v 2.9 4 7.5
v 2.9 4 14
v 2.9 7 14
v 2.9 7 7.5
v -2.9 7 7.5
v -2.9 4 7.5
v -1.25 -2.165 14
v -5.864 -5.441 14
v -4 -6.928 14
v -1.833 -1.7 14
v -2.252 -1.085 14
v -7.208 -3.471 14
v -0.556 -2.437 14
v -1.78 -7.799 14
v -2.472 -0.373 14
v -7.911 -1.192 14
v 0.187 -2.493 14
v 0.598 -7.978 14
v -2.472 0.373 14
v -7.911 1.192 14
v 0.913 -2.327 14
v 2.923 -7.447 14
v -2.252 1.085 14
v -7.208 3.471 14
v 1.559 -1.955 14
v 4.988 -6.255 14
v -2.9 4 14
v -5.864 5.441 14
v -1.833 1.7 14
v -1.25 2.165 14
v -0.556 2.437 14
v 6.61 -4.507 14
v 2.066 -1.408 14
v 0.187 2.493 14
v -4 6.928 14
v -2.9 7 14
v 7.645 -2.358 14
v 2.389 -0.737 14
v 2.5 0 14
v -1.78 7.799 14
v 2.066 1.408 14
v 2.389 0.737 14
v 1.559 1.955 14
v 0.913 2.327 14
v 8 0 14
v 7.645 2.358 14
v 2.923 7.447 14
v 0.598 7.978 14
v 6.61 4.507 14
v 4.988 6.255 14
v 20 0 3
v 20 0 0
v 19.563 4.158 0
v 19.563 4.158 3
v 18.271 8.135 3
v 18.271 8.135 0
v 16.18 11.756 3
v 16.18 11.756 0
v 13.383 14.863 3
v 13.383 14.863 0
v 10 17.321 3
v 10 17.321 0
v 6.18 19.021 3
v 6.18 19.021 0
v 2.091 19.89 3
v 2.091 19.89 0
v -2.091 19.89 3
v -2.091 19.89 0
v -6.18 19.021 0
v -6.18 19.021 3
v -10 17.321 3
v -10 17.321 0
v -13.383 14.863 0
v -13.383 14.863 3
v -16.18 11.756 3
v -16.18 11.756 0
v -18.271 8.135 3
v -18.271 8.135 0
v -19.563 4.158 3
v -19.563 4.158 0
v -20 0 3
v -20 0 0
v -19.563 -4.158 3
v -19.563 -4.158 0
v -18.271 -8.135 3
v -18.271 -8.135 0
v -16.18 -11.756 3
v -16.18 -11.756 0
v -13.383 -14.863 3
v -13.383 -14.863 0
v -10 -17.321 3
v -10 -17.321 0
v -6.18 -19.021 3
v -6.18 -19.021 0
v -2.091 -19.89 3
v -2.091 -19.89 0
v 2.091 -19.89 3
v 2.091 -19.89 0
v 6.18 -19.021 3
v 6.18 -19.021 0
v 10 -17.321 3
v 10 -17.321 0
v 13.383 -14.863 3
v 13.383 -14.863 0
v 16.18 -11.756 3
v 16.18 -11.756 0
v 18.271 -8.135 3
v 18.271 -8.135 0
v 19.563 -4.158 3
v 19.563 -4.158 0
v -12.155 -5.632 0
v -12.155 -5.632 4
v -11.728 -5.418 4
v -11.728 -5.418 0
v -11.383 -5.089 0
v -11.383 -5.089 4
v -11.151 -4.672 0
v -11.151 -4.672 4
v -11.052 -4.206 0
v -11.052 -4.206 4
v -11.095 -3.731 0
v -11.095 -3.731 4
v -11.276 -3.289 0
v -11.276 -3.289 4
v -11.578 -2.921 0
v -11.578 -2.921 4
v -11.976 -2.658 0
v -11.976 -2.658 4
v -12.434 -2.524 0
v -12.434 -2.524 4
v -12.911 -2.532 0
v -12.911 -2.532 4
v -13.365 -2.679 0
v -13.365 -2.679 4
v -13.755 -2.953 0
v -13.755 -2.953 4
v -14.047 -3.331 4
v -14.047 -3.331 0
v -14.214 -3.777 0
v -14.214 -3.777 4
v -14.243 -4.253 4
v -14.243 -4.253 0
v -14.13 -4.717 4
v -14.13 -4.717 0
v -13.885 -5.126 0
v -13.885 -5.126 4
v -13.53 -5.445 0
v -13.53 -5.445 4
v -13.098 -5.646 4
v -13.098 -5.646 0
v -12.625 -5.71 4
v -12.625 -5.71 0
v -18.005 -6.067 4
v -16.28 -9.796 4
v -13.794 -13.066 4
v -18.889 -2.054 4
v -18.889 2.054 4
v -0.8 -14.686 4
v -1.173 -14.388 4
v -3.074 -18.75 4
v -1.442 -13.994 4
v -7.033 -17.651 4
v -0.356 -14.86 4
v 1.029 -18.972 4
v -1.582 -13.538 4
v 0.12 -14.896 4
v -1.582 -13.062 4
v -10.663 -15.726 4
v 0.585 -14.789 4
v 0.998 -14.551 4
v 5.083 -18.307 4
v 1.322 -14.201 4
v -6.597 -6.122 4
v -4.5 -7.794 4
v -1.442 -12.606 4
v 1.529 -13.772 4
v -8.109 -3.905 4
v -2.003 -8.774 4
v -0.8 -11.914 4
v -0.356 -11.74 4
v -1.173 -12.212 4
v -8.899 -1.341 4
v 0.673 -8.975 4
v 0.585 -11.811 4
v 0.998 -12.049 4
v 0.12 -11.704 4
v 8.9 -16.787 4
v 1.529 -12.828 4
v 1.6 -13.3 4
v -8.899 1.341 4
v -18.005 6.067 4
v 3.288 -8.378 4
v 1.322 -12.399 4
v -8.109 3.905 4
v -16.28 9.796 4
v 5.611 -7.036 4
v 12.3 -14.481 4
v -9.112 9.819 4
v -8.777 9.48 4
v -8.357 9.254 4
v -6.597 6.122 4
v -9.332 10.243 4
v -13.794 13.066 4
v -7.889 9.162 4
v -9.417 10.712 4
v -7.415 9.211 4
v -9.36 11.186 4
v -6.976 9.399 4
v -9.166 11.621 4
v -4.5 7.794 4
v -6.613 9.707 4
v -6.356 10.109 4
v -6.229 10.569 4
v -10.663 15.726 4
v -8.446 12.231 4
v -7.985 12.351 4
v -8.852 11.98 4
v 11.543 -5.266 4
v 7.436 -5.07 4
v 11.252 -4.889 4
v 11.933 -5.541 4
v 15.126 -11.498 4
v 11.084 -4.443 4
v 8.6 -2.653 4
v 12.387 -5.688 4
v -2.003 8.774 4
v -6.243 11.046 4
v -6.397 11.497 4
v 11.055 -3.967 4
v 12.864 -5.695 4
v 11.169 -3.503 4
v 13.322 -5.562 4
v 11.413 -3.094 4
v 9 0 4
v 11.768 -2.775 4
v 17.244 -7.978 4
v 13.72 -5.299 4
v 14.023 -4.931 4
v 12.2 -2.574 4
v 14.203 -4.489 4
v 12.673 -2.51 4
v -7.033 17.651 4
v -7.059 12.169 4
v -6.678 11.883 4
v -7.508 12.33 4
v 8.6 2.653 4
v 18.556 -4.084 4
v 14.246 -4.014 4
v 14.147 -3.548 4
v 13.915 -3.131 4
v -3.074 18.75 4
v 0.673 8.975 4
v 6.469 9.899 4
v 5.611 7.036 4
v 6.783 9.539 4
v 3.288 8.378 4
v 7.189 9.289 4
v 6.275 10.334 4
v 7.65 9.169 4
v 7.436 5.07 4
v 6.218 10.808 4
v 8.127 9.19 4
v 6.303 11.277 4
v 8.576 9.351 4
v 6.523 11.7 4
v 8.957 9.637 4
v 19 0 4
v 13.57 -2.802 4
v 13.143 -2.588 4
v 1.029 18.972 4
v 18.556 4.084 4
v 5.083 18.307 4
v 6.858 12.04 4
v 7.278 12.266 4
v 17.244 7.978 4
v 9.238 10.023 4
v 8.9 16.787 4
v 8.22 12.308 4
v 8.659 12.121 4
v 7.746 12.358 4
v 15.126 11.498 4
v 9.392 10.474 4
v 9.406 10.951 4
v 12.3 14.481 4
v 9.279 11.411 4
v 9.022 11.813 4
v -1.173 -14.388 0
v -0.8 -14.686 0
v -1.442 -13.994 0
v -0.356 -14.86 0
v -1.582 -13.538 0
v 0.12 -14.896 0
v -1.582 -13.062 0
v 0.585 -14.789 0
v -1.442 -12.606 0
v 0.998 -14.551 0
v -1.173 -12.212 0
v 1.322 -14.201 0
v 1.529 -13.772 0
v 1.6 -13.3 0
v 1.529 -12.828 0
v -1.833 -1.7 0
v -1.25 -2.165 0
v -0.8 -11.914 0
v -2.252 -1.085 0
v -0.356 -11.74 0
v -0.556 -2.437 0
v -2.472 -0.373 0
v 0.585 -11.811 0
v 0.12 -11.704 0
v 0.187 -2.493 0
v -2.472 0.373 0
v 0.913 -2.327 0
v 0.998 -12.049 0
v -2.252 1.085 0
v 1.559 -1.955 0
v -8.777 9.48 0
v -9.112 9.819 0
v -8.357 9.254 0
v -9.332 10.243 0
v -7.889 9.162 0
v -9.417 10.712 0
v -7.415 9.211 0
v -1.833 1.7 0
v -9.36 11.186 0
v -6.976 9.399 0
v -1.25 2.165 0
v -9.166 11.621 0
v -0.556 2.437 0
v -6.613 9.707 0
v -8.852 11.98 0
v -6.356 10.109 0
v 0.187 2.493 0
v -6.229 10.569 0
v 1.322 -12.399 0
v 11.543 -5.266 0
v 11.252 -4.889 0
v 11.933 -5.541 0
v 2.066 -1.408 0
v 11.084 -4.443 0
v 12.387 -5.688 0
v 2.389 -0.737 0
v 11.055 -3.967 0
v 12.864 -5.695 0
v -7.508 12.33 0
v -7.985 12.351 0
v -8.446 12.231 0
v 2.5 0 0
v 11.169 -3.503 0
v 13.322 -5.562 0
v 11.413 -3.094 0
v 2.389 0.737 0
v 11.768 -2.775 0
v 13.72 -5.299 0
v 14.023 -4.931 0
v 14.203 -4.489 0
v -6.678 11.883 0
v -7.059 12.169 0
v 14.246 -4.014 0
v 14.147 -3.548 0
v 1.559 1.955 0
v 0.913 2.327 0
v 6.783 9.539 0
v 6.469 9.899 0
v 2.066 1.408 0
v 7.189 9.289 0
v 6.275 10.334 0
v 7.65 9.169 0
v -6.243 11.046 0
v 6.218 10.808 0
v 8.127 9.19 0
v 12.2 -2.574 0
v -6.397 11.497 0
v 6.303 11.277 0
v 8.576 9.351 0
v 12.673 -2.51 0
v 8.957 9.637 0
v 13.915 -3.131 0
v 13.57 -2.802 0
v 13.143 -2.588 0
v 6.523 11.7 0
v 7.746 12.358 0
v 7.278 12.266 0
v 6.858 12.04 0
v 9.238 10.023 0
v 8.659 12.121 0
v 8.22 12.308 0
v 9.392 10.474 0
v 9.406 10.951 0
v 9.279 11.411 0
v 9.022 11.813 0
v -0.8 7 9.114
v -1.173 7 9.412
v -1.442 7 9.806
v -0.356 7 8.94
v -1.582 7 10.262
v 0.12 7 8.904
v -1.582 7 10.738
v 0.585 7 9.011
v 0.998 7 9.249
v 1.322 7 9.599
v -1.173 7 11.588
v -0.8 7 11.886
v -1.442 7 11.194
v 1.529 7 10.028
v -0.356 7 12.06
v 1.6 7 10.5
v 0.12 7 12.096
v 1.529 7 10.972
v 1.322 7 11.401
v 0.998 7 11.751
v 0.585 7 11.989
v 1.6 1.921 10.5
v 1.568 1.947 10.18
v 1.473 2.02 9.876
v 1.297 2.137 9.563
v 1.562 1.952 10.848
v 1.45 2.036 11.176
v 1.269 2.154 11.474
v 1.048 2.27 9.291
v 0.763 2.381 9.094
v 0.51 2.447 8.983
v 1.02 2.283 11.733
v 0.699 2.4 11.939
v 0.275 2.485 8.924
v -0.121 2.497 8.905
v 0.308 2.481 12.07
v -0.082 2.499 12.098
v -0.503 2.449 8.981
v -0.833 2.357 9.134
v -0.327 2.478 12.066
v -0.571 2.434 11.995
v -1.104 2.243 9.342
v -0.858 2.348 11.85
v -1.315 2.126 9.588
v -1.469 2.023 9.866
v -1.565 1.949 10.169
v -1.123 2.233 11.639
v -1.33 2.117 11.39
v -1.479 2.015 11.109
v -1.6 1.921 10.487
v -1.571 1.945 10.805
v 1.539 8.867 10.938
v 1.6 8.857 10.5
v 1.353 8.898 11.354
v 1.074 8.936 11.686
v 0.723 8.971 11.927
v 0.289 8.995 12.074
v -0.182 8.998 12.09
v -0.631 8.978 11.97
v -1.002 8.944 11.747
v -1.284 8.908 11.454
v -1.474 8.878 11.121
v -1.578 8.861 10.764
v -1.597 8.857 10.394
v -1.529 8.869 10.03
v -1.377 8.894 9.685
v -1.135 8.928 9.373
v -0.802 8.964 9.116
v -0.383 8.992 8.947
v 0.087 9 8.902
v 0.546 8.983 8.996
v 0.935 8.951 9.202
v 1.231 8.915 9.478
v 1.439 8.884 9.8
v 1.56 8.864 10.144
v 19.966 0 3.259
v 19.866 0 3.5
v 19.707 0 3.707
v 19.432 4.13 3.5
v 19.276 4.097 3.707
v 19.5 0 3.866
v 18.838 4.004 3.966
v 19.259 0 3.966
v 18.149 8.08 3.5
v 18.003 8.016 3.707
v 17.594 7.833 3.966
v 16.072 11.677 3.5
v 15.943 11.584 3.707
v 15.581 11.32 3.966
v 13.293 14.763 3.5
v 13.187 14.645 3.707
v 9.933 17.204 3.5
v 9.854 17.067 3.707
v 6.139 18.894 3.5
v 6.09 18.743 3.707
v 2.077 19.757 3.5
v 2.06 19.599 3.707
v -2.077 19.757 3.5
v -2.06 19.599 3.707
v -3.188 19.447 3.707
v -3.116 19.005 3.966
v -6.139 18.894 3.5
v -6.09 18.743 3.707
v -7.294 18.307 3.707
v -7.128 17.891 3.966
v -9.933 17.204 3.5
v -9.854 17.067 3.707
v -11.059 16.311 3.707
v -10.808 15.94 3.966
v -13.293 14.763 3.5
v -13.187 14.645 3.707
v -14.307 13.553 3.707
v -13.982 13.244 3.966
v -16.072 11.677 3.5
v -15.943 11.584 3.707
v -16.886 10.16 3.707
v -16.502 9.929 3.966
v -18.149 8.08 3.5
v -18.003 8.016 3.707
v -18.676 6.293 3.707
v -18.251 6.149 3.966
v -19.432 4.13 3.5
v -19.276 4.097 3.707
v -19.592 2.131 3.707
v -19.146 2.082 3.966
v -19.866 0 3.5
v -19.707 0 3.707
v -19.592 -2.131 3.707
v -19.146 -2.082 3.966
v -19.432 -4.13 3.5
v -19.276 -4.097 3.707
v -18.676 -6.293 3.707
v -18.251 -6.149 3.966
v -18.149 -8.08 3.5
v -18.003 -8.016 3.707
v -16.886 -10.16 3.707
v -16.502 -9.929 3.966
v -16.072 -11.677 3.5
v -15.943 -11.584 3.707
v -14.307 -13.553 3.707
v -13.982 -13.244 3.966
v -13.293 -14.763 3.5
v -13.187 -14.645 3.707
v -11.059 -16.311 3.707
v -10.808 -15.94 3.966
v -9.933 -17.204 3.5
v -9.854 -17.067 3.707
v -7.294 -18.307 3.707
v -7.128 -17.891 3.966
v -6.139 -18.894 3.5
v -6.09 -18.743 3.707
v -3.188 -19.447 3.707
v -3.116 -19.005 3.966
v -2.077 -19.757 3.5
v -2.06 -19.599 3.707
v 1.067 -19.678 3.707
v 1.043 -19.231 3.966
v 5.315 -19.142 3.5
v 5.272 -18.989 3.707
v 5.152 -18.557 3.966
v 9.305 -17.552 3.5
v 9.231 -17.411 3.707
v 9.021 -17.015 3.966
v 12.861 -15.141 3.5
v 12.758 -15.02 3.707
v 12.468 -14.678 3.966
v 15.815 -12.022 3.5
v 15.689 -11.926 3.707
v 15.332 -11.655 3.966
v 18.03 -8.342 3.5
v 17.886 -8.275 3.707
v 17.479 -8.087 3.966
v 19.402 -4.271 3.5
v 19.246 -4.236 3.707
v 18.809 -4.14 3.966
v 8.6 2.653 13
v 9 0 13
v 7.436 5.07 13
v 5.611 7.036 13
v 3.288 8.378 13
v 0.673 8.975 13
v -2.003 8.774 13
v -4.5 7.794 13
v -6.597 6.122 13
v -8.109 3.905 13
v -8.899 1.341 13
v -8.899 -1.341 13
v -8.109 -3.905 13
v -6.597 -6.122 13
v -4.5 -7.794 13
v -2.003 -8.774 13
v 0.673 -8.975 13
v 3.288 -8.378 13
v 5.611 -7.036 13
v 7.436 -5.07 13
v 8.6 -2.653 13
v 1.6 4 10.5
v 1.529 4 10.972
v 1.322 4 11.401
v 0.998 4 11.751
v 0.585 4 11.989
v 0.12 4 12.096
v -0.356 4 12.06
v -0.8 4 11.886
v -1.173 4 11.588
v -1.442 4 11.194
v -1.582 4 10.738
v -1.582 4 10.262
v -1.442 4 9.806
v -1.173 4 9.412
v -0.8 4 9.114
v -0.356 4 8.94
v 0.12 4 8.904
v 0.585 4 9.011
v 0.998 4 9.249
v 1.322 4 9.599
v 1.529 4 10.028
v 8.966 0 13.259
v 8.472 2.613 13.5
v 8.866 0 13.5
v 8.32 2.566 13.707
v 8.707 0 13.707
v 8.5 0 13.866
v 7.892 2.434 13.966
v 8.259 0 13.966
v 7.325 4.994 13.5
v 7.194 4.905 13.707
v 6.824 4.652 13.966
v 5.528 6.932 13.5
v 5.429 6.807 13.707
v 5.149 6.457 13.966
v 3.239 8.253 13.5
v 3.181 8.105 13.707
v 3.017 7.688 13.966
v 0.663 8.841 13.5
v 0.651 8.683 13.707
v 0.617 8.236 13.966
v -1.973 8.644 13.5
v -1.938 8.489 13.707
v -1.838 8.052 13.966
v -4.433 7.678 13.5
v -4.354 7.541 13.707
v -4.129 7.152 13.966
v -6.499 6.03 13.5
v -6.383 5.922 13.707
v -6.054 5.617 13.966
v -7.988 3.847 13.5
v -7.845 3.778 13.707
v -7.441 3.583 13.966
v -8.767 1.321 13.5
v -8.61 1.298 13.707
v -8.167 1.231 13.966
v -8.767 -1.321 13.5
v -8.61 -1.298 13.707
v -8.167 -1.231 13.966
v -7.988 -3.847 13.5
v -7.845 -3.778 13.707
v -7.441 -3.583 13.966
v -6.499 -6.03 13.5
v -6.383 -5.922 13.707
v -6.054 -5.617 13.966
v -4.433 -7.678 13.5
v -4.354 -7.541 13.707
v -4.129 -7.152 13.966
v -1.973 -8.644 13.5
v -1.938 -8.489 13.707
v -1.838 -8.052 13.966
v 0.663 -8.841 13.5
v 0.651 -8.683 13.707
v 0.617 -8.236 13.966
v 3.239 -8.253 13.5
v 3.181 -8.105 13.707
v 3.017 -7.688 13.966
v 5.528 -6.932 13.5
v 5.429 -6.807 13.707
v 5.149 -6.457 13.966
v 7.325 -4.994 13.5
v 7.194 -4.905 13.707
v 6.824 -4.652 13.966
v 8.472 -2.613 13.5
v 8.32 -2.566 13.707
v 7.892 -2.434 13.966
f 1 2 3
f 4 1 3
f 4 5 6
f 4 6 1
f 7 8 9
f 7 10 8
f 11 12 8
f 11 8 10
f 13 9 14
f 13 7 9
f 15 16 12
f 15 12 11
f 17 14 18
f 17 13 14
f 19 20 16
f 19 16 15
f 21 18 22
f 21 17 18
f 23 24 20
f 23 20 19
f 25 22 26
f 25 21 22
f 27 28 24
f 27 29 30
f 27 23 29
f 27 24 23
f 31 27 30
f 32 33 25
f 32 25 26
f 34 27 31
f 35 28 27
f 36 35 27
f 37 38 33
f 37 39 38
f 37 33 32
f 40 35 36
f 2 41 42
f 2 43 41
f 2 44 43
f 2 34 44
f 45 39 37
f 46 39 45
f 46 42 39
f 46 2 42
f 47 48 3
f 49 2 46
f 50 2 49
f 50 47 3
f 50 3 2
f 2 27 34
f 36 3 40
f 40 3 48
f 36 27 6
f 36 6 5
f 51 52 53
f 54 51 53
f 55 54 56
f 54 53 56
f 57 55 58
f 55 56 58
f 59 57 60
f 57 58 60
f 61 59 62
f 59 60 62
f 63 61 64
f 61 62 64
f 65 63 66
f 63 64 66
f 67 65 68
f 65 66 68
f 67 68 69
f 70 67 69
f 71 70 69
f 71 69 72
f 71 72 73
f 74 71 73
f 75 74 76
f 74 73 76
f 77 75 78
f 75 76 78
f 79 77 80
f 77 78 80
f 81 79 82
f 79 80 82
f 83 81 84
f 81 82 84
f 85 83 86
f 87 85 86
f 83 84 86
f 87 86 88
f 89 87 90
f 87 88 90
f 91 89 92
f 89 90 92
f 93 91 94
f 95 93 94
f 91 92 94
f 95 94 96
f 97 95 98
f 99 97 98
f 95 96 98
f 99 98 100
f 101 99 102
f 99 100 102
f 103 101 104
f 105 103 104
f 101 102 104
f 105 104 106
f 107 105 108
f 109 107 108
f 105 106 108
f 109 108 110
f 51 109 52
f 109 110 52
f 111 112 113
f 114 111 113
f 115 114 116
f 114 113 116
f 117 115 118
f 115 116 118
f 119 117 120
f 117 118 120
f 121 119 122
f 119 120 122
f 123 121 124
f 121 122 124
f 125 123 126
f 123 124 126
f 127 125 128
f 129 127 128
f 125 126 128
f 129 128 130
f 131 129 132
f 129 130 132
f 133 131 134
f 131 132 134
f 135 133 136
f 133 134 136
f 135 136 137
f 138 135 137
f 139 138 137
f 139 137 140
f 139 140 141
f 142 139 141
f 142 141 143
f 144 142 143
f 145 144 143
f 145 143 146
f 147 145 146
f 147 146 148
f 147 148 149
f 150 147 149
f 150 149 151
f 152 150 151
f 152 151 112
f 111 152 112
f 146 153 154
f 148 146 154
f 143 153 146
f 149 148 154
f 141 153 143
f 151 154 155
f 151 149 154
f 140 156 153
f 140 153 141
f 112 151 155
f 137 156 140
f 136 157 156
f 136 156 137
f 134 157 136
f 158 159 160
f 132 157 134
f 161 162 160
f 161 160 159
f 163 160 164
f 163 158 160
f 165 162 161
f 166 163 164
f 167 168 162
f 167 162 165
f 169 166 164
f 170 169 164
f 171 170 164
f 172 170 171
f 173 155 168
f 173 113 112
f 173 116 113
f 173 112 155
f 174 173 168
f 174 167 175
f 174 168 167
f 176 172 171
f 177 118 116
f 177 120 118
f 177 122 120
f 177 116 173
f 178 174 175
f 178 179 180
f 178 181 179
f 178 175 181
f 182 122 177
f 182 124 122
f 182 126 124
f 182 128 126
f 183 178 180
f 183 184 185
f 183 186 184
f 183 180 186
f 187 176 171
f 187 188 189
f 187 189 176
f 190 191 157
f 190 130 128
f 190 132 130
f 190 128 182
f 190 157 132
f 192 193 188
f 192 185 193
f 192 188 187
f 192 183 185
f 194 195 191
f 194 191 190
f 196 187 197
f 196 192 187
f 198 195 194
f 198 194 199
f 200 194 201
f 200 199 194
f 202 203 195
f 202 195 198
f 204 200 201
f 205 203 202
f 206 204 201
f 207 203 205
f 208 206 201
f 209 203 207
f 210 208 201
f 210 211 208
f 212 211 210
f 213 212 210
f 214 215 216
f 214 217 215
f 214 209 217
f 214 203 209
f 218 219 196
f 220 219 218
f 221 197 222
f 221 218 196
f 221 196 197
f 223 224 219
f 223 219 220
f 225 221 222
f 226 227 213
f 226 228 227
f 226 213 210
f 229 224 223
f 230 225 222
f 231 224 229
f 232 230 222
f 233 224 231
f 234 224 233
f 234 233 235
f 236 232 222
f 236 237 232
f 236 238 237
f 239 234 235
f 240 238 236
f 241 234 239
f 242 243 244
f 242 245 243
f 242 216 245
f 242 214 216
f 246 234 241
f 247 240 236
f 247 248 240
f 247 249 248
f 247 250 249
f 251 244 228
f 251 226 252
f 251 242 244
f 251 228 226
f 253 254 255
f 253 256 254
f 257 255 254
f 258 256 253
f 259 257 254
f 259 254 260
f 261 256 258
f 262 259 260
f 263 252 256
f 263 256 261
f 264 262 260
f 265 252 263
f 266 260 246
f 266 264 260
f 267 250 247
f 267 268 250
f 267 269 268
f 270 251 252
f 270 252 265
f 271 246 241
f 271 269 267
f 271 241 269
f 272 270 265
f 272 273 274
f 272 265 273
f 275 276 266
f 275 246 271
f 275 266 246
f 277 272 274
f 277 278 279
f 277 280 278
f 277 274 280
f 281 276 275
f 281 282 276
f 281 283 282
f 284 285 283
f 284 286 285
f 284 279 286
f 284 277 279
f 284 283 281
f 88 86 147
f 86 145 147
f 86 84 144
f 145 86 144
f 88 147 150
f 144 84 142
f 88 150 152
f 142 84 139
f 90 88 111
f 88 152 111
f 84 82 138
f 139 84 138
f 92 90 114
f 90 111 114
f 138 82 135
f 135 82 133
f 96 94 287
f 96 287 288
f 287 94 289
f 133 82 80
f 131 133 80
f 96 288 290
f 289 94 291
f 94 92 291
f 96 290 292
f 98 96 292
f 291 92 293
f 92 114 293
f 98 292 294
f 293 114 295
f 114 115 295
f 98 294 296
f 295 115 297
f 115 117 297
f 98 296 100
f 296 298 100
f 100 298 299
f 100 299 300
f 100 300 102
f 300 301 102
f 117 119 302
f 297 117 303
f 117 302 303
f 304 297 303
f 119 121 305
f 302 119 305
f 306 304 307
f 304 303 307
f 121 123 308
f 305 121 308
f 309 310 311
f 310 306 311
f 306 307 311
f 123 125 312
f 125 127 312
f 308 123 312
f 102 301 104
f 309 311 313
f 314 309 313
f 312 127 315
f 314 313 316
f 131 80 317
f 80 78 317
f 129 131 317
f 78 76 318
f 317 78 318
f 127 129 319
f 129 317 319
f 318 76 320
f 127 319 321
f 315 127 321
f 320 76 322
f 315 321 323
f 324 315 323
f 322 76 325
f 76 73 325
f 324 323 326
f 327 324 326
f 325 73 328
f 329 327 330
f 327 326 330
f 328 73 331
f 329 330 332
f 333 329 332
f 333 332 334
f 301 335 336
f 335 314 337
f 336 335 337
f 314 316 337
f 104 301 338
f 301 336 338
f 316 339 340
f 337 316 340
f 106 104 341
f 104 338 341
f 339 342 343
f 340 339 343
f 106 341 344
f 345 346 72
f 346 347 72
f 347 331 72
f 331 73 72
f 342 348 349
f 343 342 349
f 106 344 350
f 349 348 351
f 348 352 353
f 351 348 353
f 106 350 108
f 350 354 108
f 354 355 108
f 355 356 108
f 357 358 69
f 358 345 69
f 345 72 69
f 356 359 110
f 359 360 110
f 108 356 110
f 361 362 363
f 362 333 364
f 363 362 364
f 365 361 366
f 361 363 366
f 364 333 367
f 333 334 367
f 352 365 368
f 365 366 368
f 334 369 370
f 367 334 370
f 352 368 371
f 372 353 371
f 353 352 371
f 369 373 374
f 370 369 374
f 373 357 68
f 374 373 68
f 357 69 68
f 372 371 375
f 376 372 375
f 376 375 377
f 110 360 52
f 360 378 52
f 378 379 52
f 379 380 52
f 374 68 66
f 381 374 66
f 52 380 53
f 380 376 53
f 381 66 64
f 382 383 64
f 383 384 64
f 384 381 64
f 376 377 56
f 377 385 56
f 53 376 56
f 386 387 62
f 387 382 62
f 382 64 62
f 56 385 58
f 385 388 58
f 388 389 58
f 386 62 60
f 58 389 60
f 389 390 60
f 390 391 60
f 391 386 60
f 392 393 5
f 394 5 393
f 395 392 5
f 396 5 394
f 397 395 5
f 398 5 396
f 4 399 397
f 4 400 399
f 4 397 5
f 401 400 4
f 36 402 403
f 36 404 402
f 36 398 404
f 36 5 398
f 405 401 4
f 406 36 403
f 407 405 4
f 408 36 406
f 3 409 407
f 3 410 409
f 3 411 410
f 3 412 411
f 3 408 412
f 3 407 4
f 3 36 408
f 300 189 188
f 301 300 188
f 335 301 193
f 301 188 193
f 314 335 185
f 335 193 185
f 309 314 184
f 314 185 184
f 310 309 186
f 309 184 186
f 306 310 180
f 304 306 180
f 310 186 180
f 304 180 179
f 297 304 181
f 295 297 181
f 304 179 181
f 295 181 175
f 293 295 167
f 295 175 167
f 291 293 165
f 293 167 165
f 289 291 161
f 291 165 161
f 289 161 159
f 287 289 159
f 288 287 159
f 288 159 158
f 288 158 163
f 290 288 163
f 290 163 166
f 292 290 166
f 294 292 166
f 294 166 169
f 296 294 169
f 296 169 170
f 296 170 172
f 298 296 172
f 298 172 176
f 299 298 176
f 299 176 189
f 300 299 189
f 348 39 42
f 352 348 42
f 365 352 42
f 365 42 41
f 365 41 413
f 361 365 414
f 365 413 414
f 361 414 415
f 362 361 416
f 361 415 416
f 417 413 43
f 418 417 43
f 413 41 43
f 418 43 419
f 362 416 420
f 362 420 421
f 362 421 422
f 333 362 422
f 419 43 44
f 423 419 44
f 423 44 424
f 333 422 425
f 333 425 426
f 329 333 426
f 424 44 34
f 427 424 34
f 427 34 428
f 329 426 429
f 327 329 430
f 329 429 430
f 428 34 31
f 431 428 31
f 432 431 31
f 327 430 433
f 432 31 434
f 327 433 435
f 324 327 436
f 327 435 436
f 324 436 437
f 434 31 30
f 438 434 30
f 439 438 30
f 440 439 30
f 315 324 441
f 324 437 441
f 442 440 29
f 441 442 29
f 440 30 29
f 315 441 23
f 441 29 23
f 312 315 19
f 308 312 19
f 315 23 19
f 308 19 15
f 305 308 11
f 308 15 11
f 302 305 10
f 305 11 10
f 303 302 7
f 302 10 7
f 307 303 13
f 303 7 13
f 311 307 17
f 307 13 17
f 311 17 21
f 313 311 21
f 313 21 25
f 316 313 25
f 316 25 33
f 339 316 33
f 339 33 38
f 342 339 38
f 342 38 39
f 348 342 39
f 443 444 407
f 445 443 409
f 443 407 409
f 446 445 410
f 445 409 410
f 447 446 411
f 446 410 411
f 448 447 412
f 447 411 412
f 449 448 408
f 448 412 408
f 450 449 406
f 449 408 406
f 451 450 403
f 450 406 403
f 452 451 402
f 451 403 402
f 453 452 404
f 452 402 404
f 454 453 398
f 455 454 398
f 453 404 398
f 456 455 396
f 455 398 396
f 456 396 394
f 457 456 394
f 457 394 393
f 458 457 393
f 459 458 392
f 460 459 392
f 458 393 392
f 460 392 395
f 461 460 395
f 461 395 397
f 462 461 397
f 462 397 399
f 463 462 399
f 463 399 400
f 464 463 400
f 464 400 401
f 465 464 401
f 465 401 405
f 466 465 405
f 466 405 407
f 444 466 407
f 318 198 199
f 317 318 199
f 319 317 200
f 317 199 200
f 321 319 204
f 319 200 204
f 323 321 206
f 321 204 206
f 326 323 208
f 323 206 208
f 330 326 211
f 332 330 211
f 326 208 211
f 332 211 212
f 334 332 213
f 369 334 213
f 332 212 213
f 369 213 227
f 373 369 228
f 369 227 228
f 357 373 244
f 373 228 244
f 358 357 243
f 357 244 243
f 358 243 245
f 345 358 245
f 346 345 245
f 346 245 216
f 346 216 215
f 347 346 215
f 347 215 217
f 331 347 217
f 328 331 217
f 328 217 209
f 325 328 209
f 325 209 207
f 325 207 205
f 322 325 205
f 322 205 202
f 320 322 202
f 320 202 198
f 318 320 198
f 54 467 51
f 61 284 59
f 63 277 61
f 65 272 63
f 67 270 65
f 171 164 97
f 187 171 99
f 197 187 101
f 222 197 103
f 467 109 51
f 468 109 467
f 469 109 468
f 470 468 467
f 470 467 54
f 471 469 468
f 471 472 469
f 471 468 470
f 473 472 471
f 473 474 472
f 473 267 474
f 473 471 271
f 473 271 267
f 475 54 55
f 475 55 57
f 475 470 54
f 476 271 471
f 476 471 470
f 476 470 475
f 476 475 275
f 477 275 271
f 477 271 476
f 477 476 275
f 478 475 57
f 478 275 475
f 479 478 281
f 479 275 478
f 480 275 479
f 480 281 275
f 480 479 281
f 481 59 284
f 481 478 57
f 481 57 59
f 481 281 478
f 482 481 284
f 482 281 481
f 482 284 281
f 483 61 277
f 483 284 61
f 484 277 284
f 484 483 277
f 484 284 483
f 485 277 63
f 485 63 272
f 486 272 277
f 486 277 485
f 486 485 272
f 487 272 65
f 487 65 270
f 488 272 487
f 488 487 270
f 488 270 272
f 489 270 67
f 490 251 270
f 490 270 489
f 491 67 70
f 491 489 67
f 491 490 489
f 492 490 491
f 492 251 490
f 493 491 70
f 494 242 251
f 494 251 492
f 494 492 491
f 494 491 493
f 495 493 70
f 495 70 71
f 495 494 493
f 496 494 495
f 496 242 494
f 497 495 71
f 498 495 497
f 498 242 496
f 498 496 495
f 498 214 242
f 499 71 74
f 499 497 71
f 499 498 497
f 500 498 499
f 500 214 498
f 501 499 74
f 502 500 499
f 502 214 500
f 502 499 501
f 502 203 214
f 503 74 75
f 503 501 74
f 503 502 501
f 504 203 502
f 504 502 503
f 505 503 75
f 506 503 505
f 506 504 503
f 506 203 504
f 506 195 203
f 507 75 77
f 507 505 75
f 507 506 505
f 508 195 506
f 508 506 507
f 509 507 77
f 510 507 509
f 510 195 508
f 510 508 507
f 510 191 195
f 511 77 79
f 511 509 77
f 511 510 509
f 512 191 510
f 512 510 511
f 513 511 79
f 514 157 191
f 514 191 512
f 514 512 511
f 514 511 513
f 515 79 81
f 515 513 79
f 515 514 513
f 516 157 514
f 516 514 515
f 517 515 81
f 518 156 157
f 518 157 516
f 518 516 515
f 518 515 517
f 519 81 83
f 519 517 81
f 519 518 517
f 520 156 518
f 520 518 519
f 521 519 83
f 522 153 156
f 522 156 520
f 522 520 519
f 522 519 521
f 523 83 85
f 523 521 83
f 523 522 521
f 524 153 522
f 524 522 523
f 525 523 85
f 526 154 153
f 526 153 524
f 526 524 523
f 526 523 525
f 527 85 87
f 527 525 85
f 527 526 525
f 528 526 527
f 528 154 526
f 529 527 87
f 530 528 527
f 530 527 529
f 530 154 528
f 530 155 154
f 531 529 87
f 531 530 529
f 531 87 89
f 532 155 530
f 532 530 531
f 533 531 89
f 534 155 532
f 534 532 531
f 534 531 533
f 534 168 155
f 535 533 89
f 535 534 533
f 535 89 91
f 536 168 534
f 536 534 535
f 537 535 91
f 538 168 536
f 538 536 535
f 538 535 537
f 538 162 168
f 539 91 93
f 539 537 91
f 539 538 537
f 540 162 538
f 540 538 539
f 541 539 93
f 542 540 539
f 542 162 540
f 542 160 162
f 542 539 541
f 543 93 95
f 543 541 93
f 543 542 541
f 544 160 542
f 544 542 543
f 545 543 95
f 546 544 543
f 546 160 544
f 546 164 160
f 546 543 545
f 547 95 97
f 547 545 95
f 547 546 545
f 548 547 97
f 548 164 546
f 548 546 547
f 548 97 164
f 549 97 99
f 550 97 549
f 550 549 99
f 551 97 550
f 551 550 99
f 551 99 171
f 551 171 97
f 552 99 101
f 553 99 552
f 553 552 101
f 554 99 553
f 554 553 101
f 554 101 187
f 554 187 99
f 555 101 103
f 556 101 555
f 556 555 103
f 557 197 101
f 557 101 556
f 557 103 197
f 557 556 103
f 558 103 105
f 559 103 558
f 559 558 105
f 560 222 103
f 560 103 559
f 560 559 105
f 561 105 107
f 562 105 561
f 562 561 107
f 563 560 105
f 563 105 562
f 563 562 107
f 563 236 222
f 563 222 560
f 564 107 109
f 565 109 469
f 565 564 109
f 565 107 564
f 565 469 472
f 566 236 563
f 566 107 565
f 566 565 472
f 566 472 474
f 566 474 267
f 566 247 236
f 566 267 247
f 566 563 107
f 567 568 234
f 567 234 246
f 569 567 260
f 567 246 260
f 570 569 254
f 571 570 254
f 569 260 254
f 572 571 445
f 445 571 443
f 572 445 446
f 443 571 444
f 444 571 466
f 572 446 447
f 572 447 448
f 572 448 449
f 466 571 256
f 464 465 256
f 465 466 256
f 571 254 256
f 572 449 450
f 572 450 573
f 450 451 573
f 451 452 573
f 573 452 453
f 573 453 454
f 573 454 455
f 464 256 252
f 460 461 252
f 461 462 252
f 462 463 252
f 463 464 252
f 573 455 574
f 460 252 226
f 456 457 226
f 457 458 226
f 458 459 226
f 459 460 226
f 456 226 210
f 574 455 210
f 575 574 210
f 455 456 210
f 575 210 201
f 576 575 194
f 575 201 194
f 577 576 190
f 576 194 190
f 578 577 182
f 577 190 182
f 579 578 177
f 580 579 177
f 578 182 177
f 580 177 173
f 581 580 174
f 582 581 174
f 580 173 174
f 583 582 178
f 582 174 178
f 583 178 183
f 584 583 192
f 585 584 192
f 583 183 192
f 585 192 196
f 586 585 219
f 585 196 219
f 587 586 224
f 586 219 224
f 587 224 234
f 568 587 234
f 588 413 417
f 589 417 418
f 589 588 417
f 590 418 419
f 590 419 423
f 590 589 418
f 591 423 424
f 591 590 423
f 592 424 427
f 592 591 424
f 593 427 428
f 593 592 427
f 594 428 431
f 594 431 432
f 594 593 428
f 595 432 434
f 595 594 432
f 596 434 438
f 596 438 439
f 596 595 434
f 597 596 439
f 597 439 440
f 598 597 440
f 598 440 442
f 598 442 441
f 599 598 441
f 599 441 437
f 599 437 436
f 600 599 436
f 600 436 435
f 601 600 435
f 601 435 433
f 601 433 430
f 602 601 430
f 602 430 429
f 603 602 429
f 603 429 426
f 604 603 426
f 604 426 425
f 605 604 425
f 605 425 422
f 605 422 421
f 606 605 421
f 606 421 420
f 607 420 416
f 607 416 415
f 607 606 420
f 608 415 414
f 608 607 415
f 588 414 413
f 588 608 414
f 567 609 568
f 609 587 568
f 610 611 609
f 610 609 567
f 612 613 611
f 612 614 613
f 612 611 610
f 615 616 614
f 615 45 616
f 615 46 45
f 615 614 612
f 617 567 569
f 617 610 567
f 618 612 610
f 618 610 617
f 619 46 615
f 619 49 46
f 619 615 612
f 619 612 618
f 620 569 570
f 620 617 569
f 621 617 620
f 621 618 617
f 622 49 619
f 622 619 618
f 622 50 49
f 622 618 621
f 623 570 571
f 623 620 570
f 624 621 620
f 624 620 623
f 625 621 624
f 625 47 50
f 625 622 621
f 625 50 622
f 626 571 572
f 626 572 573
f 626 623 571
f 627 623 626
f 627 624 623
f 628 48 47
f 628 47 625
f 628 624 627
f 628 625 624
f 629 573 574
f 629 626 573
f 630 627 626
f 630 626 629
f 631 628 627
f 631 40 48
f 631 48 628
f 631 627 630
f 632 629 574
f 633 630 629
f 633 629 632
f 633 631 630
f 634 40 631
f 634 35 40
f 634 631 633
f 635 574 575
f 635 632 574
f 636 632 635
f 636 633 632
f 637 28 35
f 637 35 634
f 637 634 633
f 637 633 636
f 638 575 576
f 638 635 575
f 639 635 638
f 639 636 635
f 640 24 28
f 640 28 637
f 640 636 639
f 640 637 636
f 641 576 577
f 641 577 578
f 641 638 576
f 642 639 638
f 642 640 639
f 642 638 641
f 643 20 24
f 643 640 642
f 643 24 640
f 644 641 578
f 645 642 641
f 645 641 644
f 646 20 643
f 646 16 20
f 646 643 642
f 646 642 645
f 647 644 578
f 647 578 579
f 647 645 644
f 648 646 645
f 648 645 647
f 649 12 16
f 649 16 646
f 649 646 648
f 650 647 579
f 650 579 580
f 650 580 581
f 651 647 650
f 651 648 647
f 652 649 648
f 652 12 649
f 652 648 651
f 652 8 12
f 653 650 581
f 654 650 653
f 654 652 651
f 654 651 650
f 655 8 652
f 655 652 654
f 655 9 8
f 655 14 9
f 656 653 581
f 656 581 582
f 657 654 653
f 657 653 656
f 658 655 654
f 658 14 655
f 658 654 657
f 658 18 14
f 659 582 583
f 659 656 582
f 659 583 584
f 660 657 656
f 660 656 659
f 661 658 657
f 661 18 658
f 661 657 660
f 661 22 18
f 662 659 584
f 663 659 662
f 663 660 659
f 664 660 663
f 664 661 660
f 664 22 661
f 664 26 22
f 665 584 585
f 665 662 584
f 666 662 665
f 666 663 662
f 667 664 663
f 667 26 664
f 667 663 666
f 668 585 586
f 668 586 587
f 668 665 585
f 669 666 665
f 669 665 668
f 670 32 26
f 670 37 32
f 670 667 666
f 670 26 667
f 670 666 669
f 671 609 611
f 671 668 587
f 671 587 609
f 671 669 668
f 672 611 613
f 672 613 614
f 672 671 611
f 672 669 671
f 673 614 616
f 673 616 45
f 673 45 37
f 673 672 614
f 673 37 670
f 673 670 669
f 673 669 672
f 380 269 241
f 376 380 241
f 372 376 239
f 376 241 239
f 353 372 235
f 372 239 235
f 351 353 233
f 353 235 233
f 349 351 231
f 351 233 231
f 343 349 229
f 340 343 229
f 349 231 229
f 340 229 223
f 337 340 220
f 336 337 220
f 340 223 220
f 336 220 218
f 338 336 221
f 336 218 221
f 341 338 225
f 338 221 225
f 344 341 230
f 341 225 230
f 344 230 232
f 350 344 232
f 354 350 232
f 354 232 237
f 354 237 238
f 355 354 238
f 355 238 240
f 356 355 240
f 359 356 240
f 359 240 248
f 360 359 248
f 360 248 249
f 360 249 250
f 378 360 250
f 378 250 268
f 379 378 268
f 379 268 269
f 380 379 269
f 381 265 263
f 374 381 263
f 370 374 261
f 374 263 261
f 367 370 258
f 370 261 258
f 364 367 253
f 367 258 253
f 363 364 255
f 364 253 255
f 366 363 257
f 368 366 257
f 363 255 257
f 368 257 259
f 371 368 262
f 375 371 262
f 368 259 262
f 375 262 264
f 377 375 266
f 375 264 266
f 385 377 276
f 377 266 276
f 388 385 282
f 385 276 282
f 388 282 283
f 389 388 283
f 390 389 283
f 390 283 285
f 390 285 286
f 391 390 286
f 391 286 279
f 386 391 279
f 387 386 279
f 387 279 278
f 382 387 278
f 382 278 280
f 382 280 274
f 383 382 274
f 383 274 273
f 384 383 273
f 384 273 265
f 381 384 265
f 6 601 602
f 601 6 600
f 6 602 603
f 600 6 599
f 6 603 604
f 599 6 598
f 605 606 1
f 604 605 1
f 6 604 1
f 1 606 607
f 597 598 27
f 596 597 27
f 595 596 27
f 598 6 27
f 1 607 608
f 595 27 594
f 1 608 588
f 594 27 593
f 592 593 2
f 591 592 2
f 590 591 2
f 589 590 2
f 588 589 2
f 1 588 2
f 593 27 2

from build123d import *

# Parameters (mm, degrees)
SKETCH_R             = 20
PAD_DEPTH            = 4
SKETCH001_R          = 1.6
POCKET_DEPTH         = 117.420575
POLARPATTERN_COUNT   = 5
SKETCH002_R          = 9
PAD001_DEPTH         = 10
SKETCH003_R          = 2.5
POCKET001_DEPTH      = 14.001
SKETCH004_W          = 5.8
SKETCH004_H          = 3
POCKET002_DEPTH      = 6.5
SKETCH005_R          = 1.6
POCKET003_DEPTH      = 6
POCKET003_DEPTH_BACK = -6
FILLET_R             = 1


with BuildPart() as part:
    # Sketch → Pad (new body)
    with BuildSketch(Plane.XY):
        Circle(SKETCH_R)
    extrude(amount=PAD_DEPTH)

    # Sketch001 (on Face3 of Pad) → Pocket (cut, through all)
    with BuildSketch(Plane.XY.offset(4)):
        with Locations((0, -13.3)):
            Circle(SKETCH001_R)
    pocket = extrude(amount=-POCKET_DEPTH, mode=Mode.SUBTRACT)

    # PolarPattern: Pocket ×5 about axis
    polarpattern_axis = Axis((0, 0, 4), (0, 0, 1))
    for i in range(1, POLARPATTERN_COUNT):
        add(pocket.rotate(polarpattern_axis, i * 360 / POLARPATTERN_COUNT), mode=Mode.SUBTRACT)

    # Sketch002 (on Face3 of PolarPattern) → Pad001 (join)
    with BuildSketch(Plane.XY.offset(4)):
        Circle(SKETCH002_R)
    extrude(amount=PAD001_DEPTH)

    # Sketch003 (on Face10 of Pad001) → Pocket001 (cut, through all)
    with BuildSketch(Plane.XY.offset(14)):
        Circle(SKETCH003_R)
    extrude(amount=-POCKET001_DEPTH, mode=Mode.SUBTRACT)

    # Sketch004 (on Face11 of Pocket001) → Pocket002 (cut)
    with BuildSketch(Plane.XY.offset(14)):
        with Locations((0, 5.5)):
            Rectangle(SKETCH004_W, SKETCH004_H)
    extrude(amount=-POCKET002_DEPTH, mode=Mode.SUBTRACT)

    # Sketch005 (on Face15 of Pocket002) → Pocket003 (cut, two sides)
    with BuildSketch(Plane.XZ.offset(-7)) as pocket003_sk:
        with Locations((0, 10.5)):
            Circle(SKETCH005_R)
    extrude(amount=-POCKET003_DEPTH, mode=Mode.SUBTRACT)
    extrude(pocket003_sk.sketch, amount=-POCKET003_DEPTH_BACK, mode=Mode.SUBTRACT)

    # Fillet
    fillet_edges = [part.edges().sort_by_distance(p)[0] for p in [
        (-20, 0, 4),
        (-9, 0, 14),
    ]]
    fillet(fillet_edges, radius=FILLET_R)


solid = part.part
